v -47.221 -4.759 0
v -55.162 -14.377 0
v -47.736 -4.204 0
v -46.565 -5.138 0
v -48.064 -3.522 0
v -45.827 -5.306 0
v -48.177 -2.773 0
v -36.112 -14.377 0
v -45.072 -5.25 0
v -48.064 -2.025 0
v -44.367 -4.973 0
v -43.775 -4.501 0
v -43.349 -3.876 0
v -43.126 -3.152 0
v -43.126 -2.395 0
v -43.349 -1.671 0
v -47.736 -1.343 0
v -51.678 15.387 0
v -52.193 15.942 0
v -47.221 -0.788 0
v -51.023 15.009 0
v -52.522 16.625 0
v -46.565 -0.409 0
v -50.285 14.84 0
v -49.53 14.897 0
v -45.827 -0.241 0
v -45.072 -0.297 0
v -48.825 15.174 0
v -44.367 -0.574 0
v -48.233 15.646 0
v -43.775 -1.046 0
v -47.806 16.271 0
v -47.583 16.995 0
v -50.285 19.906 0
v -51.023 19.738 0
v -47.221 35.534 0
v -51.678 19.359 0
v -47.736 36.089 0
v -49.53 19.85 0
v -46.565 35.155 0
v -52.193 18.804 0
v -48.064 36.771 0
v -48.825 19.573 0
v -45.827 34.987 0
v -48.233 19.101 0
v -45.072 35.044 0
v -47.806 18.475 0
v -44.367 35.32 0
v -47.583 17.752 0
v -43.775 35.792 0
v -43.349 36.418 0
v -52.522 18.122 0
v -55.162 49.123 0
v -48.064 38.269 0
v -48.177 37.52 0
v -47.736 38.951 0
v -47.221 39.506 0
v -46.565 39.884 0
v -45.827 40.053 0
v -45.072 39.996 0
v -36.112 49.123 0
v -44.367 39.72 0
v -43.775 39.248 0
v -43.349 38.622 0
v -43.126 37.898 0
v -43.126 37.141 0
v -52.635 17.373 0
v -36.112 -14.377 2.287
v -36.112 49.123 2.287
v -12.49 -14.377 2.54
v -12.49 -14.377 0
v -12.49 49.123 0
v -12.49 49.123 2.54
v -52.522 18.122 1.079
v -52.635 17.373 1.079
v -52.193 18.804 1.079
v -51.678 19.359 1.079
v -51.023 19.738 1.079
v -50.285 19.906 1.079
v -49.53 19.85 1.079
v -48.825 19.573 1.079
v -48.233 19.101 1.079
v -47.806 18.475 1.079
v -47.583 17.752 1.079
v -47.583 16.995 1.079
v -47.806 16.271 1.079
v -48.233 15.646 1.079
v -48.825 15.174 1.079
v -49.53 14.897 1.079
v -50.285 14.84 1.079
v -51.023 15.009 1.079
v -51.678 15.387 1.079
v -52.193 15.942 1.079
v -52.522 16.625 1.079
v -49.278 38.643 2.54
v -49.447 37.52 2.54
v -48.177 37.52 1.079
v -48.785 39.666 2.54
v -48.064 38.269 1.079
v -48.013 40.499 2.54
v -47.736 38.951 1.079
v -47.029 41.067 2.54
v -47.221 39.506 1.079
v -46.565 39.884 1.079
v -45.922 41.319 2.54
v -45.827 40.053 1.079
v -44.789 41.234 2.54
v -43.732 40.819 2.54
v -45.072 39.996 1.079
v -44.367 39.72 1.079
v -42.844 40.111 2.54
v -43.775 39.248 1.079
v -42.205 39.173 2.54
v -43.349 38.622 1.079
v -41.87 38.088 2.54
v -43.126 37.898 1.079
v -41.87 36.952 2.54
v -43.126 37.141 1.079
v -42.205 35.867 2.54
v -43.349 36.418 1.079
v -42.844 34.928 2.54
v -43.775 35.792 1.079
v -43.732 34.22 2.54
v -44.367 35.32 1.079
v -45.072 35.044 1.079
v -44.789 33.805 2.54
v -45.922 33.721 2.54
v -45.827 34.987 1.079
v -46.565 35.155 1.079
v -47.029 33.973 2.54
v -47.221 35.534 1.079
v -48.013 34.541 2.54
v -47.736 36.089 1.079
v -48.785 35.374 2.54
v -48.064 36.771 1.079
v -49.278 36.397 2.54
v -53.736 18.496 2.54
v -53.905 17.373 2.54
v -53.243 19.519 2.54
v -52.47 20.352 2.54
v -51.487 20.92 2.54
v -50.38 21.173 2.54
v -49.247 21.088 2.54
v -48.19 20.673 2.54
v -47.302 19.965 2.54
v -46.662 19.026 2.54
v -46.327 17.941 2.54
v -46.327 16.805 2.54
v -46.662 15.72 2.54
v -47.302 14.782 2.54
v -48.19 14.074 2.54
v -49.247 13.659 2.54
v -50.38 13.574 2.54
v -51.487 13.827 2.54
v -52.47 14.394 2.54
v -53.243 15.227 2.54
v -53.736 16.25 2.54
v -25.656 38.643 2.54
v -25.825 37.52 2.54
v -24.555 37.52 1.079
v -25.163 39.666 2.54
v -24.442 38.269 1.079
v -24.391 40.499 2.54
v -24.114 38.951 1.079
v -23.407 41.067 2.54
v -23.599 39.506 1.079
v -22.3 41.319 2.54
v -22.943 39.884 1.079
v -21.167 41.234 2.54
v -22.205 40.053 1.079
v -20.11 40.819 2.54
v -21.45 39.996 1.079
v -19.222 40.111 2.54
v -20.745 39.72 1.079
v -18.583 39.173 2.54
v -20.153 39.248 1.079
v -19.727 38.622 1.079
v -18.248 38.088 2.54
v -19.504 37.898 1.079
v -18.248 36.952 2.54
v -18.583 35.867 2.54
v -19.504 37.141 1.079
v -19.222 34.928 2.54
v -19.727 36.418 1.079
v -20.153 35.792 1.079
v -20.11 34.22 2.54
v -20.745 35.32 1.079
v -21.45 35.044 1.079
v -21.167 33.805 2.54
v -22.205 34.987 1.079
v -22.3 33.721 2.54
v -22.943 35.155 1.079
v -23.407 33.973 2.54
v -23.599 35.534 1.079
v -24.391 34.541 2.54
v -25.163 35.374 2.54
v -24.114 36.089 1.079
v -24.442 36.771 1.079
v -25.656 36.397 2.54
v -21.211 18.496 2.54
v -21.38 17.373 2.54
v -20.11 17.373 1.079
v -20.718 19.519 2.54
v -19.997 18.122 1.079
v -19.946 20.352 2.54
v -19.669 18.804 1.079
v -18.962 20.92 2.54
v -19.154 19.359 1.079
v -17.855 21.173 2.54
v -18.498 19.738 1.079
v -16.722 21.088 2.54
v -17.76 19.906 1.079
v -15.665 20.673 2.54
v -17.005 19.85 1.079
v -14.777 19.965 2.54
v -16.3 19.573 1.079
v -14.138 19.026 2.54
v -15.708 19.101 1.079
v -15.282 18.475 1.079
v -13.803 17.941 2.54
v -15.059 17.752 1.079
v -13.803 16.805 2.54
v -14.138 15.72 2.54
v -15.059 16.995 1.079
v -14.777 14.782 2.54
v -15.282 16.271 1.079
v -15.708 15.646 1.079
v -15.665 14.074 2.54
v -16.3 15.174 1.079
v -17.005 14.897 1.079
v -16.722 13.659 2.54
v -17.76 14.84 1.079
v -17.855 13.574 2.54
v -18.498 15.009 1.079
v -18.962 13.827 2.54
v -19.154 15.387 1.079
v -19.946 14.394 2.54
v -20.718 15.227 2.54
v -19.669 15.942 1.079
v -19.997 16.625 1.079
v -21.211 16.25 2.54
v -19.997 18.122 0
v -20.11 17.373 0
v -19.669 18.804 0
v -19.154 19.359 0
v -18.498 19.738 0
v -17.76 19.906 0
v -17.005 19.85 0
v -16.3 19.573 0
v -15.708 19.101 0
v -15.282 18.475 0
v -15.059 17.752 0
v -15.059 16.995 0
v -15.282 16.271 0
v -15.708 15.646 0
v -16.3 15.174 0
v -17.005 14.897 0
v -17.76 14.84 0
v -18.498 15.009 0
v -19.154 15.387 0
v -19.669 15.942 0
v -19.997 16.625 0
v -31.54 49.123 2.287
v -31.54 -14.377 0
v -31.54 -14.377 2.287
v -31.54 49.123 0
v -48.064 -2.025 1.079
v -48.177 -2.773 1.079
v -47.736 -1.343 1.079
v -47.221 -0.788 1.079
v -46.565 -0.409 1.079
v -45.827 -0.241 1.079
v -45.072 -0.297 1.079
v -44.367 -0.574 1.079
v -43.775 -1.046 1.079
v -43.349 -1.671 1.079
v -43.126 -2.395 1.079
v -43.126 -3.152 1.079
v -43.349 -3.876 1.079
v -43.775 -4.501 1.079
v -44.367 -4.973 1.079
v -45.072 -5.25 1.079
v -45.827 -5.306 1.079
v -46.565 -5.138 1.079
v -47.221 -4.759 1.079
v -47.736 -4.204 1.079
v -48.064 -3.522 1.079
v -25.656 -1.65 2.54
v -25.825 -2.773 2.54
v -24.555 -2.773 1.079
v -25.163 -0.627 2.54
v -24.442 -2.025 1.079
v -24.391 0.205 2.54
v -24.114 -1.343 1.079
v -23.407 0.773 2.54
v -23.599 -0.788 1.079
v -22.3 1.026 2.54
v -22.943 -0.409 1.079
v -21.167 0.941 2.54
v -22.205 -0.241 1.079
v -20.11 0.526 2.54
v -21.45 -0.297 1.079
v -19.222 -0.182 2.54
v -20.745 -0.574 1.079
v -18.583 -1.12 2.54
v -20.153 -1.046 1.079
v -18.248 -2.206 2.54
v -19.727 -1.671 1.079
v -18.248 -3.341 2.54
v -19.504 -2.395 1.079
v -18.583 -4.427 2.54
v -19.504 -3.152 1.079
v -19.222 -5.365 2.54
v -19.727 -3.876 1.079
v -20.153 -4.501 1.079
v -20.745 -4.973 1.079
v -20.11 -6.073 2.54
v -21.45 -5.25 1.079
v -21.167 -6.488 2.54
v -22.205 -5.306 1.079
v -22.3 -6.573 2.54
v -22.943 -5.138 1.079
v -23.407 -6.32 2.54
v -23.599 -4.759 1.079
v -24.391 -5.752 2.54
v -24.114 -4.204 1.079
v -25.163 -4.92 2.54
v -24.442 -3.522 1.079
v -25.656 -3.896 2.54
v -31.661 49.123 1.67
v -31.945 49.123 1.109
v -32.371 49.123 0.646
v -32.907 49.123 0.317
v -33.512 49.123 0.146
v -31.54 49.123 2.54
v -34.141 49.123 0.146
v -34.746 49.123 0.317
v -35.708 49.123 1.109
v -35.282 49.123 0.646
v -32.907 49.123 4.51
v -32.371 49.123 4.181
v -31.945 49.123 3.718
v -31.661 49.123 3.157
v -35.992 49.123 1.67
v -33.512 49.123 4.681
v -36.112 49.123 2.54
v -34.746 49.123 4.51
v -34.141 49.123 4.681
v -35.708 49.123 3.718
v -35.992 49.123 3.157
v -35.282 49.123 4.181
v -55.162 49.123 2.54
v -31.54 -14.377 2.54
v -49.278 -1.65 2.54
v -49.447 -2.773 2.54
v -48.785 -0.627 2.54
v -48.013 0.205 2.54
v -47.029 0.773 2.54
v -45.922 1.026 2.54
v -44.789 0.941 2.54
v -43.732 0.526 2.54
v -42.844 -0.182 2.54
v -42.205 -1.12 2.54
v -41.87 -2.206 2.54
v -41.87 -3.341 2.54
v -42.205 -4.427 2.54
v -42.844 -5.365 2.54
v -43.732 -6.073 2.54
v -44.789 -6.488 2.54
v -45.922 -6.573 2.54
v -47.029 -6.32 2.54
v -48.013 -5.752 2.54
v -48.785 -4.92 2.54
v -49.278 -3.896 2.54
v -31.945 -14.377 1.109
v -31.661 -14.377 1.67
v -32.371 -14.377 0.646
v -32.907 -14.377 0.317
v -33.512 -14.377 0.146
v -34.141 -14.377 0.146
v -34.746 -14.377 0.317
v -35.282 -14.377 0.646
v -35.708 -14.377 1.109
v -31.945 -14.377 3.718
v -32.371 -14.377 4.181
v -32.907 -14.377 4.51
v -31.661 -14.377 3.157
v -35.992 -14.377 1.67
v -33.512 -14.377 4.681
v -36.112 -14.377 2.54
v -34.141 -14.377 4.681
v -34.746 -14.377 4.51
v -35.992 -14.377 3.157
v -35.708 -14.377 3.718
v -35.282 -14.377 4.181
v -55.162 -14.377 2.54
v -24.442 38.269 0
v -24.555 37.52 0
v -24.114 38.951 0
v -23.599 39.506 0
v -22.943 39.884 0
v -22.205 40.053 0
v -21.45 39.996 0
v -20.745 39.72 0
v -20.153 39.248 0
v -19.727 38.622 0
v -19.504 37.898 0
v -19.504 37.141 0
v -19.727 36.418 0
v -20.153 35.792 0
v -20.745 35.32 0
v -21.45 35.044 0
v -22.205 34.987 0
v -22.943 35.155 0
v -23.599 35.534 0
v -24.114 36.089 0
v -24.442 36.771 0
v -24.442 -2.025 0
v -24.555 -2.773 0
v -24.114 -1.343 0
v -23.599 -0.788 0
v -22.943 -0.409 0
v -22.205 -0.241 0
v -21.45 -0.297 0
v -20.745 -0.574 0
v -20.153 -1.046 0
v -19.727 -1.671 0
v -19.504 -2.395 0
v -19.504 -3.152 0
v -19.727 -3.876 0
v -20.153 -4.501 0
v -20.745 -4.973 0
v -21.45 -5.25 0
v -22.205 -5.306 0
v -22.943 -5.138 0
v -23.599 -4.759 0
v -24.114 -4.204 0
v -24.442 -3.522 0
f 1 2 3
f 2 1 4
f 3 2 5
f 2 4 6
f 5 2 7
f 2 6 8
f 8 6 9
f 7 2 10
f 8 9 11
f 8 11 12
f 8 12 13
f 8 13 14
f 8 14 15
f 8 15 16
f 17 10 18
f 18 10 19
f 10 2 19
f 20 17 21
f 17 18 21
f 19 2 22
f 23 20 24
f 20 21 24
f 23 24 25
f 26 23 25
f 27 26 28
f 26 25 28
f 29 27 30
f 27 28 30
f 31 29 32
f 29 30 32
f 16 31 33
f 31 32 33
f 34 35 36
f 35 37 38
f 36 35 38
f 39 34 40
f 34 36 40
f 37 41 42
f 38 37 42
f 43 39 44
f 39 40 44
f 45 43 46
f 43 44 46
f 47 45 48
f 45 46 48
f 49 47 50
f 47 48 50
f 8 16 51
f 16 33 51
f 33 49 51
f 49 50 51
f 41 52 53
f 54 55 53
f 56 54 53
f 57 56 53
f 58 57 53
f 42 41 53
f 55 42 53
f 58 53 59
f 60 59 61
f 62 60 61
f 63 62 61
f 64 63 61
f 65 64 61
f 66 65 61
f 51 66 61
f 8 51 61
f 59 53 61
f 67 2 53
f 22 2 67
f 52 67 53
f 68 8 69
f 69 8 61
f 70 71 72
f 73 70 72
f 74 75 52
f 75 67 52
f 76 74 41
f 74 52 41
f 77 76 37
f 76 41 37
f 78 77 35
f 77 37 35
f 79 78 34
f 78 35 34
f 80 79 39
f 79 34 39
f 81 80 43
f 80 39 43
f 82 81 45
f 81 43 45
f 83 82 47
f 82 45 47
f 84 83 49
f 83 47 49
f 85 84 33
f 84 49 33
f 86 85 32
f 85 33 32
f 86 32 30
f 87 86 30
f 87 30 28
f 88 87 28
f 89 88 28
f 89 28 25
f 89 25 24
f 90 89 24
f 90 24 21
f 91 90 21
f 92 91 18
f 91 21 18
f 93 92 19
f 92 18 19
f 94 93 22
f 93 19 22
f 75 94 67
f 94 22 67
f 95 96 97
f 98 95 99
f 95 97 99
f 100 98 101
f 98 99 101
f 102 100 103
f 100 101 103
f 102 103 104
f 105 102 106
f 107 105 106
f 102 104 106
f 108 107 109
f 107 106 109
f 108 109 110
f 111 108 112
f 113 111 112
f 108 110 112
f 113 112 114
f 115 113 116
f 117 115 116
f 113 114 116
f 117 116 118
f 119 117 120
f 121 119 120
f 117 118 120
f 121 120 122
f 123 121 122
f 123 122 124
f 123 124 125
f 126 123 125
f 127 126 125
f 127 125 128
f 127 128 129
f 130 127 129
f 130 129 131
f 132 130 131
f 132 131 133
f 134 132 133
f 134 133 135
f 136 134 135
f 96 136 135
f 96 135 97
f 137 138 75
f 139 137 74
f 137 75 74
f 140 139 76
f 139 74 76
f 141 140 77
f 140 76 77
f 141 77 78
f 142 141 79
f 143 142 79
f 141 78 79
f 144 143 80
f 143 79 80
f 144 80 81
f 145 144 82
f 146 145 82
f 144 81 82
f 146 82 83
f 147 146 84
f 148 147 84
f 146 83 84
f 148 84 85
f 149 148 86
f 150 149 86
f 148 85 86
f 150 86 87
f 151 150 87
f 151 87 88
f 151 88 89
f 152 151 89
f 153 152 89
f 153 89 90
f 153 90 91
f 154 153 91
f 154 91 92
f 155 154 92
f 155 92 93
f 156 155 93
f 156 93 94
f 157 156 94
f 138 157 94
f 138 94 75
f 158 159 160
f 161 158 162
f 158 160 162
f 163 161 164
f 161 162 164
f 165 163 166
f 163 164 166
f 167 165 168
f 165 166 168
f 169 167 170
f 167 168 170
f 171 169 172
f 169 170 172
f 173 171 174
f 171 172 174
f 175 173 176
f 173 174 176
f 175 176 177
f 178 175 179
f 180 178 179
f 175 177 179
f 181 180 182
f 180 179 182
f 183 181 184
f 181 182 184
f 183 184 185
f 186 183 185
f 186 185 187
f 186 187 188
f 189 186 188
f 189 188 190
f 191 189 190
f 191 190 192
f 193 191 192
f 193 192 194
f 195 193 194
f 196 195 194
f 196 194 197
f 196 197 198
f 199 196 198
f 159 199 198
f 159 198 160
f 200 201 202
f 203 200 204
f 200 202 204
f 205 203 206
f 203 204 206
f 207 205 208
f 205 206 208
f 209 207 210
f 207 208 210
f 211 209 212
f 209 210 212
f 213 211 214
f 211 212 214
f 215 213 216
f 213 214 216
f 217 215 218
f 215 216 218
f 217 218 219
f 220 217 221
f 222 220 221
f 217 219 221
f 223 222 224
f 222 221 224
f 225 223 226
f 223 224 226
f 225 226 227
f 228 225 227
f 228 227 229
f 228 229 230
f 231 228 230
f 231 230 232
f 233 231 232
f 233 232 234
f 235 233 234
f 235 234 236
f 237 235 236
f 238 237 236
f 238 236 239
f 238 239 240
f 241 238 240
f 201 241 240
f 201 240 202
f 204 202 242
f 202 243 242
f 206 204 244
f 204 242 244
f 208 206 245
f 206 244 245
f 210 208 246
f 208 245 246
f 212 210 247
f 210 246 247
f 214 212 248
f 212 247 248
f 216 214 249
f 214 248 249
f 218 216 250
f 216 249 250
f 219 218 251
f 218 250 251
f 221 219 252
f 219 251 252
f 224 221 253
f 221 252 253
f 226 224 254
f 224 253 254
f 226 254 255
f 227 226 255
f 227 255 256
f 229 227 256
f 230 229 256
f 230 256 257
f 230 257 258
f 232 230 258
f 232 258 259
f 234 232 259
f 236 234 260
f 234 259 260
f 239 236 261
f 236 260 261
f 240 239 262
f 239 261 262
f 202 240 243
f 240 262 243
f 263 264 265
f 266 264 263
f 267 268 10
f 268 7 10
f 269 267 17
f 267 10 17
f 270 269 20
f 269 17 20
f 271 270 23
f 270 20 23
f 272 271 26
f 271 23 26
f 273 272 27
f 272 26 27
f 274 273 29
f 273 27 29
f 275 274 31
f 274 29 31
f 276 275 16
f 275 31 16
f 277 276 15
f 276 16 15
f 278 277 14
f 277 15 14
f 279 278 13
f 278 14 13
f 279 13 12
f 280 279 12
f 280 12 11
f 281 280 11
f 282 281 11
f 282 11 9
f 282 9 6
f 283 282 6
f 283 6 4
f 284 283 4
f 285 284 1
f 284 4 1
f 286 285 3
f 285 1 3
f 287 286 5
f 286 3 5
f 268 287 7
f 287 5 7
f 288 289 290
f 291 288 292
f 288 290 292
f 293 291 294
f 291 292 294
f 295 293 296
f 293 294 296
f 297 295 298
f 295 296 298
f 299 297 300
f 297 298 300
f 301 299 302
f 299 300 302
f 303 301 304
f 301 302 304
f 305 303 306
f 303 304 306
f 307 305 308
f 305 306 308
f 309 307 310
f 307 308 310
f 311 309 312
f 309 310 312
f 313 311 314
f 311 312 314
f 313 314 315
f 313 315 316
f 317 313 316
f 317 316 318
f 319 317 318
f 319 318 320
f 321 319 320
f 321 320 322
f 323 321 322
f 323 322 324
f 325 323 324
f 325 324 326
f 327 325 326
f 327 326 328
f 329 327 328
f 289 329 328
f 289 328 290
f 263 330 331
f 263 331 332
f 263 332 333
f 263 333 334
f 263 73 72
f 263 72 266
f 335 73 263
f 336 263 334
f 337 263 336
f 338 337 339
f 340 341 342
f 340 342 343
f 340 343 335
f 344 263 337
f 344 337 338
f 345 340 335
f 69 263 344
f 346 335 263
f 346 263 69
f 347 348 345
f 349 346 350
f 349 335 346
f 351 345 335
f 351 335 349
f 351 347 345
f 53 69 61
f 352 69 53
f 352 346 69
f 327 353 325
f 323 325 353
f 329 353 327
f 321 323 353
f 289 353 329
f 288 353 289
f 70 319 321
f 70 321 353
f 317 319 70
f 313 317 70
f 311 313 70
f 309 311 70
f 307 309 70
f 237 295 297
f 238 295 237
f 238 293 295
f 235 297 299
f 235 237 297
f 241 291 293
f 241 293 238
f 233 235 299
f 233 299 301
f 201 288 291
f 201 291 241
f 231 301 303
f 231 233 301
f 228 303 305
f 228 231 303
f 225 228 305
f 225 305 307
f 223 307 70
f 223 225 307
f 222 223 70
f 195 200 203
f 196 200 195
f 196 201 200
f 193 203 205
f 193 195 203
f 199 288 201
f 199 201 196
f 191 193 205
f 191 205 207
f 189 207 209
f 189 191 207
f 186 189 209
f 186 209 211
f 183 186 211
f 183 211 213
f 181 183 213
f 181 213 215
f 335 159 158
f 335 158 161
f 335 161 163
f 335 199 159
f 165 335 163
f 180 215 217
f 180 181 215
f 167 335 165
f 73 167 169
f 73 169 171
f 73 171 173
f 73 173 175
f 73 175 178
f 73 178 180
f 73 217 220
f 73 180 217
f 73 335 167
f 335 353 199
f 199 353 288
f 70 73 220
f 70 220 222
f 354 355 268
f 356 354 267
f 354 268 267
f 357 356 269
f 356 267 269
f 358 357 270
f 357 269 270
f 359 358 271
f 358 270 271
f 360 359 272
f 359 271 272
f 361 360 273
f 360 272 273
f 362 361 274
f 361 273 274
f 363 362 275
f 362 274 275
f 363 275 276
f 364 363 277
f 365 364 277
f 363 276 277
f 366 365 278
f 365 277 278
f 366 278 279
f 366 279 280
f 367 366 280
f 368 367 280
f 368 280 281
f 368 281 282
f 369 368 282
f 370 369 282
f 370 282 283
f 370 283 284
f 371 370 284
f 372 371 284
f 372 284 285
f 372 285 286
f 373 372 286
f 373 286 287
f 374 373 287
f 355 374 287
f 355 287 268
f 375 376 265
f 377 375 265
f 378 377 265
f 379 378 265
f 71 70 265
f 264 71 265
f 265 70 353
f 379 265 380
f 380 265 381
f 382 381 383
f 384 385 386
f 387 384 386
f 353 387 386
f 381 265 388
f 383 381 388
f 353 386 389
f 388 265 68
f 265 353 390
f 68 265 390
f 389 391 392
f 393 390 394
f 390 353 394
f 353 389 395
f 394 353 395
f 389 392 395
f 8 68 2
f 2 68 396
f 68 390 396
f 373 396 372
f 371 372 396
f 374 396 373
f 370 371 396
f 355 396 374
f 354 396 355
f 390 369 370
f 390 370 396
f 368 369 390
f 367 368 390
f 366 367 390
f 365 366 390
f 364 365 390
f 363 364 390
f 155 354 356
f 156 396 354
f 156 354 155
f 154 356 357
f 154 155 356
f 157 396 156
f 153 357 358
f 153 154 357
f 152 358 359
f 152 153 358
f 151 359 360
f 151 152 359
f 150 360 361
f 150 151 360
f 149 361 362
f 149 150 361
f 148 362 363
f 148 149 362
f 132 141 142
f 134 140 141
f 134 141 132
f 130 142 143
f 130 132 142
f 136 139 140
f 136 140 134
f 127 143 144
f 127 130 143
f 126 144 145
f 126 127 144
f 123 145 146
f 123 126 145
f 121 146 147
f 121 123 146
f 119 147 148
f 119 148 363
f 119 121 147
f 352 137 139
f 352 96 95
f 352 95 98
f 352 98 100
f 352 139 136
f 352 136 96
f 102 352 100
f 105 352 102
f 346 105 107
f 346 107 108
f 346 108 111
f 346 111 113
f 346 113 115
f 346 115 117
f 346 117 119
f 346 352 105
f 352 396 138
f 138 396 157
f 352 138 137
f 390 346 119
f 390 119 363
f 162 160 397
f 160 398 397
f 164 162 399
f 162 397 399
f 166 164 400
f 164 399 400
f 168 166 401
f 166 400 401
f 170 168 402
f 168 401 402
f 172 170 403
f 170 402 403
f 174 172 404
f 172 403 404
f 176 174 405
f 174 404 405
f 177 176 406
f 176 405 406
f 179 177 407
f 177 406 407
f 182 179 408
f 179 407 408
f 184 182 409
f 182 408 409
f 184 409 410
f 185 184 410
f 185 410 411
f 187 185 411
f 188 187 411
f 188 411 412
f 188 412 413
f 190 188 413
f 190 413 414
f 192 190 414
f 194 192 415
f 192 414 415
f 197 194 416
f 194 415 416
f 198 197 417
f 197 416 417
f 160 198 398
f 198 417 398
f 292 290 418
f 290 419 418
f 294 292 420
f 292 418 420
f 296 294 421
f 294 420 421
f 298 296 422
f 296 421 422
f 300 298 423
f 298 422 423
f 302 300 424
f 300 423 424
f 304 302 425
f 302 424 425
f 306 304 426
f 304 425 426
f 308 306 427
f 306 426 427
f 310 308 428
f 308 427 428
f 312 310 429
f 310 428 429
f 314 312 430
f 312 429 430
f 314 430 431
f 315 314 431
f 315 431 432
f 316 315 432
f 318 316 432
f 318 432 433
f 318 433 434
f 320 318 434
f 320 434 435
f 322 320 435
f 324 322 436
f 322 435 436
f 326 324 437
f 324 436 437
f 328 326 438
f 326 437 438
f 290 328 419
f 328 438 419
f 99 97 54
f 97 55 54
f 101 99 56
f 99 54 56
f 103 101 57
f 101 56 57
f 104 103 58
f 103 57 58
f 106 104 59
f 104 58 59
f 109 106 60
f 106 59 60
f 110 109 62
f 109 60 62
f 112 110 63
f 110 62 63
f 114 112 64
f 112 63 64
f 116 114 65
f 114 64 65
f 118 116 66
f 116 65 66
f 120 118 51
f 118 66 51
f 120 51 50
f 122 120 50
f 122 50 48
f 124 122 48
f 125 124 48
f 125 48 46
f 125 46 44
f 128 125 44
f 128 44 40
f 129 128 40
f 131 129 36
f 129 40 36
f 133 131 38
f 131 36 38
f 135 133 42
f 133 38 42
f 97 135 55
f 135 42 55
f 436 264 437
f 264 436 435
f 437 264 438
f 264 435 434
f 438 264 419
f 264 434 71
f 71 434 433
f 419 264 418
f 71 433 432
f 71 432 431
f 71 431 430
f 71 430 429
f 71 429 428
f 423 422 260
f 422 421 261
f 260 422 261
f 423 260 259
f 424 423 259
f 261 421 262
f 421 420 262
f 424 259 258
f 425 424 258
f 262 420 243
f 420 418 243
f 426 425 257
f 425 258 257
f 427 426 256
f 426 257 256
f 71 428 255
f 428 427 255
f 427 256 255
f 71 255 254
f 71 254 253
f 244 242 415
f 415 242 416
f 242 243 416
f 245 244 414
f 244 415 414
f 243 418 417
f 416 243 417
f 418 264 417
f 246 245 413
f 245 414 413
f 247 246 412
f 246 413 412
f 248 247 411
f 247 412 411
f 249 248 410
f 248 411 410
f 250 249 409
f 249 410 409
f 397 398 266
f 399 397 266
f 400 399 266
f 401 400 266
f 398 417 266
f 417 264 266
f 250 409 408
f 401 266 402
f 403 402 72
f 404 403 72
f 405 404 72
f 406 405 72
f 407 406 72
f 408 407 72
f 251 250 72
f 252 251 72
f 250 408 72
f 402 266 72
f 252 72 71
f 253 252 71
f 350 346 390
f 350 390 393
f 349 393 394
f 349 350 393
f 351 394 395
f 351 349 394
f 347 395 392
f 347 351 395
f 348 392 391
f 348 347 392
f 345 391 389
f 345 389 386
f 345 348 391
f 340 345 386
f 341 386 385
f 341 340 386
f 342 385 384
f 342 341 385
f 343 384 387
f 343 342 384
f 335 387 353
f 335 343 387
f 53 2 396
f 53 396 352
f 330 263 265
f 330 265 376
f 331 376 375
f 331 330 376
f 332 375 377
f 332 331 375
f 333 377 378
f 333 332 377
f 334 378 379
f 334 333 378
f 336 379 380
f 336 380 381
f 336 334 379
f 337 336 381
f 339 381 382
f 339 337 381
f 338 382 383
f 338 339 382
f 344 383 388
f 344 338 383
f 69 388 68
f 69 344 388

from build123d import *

# Parameters (mm, degrees)
F0_W           = 19.05
F0_H           = 63.5
F1_DEPTH       = 2.54
F3_DEPTH       = 63.5
F5_D           = 5.08
F5_CSINK_D     = 7.62
F5_CSINK_ANGLE = 82


with BuildPart() as f1:
    # F0 (on Top) → F1 (new body)
    with BuildSketch(Plane.XY):
        with Locations((-45.6372228205, 17.373234883)):
            Rectangle(F0_W, F0_H)
    extrude(amount=F1_DEPTH)



with BuildPart() as f1b:
    # F0 (on Top) → F1, piece 2 (new body)
    with BuildSketch(Plane.XY):
        with Locations((-22.0152228205, 17.373234883)):
            Rectangle(F0_W, F0_H)
    extrude(amount=F1_DEPTH)


with BuildPart() as f1_1:
    add(f1.part)

    add(f1b.part)  # F3 merges F1b
    # F2 (on face) → F3 (join)
    with BuildSketch(Plane(origin=(0, 49.123234883, 0), x_dir=(-1, 0, 0), z_dir=(0, 1, 0))):
        with BuildLine():
            Line((31.5402228205, 2.54), (31.5402228205, 2.2870220252))
            ThreePointArc((31.5402228205, 2.2870220252), (33.8262228205, 0.1240142417), (36.1122228205, 2.2870220252))
            Line((36.1122228205, 2.2870220252), (36.1122228205, 2.54))
            ThreePointArc((36.1122228205, 2.54), (33.8262228205, 4.7030077835), (31.5402228205, 2.54))
        make_face()
    extrude(amount=-F3_DEPTH)

    # F5 (through all)
    with Locations(Plane.XY.offset(2.54)):
        with Locations((-45.6372228205, -2.7734471262), (-22.0152228205, -2.7734471262), (-17.5702228205, 17.373234883), (-50.0948168337, 17.373234883), (-45.6372228205, 37.5199168921), (-22.0152228205, 37.5199168921)):
            CounterSinkHole(F5_D / 2, F5_CSINK_D / 2, counter_sink_angle=F5_CSINK_ANGLE)


solid = f1_1.part
